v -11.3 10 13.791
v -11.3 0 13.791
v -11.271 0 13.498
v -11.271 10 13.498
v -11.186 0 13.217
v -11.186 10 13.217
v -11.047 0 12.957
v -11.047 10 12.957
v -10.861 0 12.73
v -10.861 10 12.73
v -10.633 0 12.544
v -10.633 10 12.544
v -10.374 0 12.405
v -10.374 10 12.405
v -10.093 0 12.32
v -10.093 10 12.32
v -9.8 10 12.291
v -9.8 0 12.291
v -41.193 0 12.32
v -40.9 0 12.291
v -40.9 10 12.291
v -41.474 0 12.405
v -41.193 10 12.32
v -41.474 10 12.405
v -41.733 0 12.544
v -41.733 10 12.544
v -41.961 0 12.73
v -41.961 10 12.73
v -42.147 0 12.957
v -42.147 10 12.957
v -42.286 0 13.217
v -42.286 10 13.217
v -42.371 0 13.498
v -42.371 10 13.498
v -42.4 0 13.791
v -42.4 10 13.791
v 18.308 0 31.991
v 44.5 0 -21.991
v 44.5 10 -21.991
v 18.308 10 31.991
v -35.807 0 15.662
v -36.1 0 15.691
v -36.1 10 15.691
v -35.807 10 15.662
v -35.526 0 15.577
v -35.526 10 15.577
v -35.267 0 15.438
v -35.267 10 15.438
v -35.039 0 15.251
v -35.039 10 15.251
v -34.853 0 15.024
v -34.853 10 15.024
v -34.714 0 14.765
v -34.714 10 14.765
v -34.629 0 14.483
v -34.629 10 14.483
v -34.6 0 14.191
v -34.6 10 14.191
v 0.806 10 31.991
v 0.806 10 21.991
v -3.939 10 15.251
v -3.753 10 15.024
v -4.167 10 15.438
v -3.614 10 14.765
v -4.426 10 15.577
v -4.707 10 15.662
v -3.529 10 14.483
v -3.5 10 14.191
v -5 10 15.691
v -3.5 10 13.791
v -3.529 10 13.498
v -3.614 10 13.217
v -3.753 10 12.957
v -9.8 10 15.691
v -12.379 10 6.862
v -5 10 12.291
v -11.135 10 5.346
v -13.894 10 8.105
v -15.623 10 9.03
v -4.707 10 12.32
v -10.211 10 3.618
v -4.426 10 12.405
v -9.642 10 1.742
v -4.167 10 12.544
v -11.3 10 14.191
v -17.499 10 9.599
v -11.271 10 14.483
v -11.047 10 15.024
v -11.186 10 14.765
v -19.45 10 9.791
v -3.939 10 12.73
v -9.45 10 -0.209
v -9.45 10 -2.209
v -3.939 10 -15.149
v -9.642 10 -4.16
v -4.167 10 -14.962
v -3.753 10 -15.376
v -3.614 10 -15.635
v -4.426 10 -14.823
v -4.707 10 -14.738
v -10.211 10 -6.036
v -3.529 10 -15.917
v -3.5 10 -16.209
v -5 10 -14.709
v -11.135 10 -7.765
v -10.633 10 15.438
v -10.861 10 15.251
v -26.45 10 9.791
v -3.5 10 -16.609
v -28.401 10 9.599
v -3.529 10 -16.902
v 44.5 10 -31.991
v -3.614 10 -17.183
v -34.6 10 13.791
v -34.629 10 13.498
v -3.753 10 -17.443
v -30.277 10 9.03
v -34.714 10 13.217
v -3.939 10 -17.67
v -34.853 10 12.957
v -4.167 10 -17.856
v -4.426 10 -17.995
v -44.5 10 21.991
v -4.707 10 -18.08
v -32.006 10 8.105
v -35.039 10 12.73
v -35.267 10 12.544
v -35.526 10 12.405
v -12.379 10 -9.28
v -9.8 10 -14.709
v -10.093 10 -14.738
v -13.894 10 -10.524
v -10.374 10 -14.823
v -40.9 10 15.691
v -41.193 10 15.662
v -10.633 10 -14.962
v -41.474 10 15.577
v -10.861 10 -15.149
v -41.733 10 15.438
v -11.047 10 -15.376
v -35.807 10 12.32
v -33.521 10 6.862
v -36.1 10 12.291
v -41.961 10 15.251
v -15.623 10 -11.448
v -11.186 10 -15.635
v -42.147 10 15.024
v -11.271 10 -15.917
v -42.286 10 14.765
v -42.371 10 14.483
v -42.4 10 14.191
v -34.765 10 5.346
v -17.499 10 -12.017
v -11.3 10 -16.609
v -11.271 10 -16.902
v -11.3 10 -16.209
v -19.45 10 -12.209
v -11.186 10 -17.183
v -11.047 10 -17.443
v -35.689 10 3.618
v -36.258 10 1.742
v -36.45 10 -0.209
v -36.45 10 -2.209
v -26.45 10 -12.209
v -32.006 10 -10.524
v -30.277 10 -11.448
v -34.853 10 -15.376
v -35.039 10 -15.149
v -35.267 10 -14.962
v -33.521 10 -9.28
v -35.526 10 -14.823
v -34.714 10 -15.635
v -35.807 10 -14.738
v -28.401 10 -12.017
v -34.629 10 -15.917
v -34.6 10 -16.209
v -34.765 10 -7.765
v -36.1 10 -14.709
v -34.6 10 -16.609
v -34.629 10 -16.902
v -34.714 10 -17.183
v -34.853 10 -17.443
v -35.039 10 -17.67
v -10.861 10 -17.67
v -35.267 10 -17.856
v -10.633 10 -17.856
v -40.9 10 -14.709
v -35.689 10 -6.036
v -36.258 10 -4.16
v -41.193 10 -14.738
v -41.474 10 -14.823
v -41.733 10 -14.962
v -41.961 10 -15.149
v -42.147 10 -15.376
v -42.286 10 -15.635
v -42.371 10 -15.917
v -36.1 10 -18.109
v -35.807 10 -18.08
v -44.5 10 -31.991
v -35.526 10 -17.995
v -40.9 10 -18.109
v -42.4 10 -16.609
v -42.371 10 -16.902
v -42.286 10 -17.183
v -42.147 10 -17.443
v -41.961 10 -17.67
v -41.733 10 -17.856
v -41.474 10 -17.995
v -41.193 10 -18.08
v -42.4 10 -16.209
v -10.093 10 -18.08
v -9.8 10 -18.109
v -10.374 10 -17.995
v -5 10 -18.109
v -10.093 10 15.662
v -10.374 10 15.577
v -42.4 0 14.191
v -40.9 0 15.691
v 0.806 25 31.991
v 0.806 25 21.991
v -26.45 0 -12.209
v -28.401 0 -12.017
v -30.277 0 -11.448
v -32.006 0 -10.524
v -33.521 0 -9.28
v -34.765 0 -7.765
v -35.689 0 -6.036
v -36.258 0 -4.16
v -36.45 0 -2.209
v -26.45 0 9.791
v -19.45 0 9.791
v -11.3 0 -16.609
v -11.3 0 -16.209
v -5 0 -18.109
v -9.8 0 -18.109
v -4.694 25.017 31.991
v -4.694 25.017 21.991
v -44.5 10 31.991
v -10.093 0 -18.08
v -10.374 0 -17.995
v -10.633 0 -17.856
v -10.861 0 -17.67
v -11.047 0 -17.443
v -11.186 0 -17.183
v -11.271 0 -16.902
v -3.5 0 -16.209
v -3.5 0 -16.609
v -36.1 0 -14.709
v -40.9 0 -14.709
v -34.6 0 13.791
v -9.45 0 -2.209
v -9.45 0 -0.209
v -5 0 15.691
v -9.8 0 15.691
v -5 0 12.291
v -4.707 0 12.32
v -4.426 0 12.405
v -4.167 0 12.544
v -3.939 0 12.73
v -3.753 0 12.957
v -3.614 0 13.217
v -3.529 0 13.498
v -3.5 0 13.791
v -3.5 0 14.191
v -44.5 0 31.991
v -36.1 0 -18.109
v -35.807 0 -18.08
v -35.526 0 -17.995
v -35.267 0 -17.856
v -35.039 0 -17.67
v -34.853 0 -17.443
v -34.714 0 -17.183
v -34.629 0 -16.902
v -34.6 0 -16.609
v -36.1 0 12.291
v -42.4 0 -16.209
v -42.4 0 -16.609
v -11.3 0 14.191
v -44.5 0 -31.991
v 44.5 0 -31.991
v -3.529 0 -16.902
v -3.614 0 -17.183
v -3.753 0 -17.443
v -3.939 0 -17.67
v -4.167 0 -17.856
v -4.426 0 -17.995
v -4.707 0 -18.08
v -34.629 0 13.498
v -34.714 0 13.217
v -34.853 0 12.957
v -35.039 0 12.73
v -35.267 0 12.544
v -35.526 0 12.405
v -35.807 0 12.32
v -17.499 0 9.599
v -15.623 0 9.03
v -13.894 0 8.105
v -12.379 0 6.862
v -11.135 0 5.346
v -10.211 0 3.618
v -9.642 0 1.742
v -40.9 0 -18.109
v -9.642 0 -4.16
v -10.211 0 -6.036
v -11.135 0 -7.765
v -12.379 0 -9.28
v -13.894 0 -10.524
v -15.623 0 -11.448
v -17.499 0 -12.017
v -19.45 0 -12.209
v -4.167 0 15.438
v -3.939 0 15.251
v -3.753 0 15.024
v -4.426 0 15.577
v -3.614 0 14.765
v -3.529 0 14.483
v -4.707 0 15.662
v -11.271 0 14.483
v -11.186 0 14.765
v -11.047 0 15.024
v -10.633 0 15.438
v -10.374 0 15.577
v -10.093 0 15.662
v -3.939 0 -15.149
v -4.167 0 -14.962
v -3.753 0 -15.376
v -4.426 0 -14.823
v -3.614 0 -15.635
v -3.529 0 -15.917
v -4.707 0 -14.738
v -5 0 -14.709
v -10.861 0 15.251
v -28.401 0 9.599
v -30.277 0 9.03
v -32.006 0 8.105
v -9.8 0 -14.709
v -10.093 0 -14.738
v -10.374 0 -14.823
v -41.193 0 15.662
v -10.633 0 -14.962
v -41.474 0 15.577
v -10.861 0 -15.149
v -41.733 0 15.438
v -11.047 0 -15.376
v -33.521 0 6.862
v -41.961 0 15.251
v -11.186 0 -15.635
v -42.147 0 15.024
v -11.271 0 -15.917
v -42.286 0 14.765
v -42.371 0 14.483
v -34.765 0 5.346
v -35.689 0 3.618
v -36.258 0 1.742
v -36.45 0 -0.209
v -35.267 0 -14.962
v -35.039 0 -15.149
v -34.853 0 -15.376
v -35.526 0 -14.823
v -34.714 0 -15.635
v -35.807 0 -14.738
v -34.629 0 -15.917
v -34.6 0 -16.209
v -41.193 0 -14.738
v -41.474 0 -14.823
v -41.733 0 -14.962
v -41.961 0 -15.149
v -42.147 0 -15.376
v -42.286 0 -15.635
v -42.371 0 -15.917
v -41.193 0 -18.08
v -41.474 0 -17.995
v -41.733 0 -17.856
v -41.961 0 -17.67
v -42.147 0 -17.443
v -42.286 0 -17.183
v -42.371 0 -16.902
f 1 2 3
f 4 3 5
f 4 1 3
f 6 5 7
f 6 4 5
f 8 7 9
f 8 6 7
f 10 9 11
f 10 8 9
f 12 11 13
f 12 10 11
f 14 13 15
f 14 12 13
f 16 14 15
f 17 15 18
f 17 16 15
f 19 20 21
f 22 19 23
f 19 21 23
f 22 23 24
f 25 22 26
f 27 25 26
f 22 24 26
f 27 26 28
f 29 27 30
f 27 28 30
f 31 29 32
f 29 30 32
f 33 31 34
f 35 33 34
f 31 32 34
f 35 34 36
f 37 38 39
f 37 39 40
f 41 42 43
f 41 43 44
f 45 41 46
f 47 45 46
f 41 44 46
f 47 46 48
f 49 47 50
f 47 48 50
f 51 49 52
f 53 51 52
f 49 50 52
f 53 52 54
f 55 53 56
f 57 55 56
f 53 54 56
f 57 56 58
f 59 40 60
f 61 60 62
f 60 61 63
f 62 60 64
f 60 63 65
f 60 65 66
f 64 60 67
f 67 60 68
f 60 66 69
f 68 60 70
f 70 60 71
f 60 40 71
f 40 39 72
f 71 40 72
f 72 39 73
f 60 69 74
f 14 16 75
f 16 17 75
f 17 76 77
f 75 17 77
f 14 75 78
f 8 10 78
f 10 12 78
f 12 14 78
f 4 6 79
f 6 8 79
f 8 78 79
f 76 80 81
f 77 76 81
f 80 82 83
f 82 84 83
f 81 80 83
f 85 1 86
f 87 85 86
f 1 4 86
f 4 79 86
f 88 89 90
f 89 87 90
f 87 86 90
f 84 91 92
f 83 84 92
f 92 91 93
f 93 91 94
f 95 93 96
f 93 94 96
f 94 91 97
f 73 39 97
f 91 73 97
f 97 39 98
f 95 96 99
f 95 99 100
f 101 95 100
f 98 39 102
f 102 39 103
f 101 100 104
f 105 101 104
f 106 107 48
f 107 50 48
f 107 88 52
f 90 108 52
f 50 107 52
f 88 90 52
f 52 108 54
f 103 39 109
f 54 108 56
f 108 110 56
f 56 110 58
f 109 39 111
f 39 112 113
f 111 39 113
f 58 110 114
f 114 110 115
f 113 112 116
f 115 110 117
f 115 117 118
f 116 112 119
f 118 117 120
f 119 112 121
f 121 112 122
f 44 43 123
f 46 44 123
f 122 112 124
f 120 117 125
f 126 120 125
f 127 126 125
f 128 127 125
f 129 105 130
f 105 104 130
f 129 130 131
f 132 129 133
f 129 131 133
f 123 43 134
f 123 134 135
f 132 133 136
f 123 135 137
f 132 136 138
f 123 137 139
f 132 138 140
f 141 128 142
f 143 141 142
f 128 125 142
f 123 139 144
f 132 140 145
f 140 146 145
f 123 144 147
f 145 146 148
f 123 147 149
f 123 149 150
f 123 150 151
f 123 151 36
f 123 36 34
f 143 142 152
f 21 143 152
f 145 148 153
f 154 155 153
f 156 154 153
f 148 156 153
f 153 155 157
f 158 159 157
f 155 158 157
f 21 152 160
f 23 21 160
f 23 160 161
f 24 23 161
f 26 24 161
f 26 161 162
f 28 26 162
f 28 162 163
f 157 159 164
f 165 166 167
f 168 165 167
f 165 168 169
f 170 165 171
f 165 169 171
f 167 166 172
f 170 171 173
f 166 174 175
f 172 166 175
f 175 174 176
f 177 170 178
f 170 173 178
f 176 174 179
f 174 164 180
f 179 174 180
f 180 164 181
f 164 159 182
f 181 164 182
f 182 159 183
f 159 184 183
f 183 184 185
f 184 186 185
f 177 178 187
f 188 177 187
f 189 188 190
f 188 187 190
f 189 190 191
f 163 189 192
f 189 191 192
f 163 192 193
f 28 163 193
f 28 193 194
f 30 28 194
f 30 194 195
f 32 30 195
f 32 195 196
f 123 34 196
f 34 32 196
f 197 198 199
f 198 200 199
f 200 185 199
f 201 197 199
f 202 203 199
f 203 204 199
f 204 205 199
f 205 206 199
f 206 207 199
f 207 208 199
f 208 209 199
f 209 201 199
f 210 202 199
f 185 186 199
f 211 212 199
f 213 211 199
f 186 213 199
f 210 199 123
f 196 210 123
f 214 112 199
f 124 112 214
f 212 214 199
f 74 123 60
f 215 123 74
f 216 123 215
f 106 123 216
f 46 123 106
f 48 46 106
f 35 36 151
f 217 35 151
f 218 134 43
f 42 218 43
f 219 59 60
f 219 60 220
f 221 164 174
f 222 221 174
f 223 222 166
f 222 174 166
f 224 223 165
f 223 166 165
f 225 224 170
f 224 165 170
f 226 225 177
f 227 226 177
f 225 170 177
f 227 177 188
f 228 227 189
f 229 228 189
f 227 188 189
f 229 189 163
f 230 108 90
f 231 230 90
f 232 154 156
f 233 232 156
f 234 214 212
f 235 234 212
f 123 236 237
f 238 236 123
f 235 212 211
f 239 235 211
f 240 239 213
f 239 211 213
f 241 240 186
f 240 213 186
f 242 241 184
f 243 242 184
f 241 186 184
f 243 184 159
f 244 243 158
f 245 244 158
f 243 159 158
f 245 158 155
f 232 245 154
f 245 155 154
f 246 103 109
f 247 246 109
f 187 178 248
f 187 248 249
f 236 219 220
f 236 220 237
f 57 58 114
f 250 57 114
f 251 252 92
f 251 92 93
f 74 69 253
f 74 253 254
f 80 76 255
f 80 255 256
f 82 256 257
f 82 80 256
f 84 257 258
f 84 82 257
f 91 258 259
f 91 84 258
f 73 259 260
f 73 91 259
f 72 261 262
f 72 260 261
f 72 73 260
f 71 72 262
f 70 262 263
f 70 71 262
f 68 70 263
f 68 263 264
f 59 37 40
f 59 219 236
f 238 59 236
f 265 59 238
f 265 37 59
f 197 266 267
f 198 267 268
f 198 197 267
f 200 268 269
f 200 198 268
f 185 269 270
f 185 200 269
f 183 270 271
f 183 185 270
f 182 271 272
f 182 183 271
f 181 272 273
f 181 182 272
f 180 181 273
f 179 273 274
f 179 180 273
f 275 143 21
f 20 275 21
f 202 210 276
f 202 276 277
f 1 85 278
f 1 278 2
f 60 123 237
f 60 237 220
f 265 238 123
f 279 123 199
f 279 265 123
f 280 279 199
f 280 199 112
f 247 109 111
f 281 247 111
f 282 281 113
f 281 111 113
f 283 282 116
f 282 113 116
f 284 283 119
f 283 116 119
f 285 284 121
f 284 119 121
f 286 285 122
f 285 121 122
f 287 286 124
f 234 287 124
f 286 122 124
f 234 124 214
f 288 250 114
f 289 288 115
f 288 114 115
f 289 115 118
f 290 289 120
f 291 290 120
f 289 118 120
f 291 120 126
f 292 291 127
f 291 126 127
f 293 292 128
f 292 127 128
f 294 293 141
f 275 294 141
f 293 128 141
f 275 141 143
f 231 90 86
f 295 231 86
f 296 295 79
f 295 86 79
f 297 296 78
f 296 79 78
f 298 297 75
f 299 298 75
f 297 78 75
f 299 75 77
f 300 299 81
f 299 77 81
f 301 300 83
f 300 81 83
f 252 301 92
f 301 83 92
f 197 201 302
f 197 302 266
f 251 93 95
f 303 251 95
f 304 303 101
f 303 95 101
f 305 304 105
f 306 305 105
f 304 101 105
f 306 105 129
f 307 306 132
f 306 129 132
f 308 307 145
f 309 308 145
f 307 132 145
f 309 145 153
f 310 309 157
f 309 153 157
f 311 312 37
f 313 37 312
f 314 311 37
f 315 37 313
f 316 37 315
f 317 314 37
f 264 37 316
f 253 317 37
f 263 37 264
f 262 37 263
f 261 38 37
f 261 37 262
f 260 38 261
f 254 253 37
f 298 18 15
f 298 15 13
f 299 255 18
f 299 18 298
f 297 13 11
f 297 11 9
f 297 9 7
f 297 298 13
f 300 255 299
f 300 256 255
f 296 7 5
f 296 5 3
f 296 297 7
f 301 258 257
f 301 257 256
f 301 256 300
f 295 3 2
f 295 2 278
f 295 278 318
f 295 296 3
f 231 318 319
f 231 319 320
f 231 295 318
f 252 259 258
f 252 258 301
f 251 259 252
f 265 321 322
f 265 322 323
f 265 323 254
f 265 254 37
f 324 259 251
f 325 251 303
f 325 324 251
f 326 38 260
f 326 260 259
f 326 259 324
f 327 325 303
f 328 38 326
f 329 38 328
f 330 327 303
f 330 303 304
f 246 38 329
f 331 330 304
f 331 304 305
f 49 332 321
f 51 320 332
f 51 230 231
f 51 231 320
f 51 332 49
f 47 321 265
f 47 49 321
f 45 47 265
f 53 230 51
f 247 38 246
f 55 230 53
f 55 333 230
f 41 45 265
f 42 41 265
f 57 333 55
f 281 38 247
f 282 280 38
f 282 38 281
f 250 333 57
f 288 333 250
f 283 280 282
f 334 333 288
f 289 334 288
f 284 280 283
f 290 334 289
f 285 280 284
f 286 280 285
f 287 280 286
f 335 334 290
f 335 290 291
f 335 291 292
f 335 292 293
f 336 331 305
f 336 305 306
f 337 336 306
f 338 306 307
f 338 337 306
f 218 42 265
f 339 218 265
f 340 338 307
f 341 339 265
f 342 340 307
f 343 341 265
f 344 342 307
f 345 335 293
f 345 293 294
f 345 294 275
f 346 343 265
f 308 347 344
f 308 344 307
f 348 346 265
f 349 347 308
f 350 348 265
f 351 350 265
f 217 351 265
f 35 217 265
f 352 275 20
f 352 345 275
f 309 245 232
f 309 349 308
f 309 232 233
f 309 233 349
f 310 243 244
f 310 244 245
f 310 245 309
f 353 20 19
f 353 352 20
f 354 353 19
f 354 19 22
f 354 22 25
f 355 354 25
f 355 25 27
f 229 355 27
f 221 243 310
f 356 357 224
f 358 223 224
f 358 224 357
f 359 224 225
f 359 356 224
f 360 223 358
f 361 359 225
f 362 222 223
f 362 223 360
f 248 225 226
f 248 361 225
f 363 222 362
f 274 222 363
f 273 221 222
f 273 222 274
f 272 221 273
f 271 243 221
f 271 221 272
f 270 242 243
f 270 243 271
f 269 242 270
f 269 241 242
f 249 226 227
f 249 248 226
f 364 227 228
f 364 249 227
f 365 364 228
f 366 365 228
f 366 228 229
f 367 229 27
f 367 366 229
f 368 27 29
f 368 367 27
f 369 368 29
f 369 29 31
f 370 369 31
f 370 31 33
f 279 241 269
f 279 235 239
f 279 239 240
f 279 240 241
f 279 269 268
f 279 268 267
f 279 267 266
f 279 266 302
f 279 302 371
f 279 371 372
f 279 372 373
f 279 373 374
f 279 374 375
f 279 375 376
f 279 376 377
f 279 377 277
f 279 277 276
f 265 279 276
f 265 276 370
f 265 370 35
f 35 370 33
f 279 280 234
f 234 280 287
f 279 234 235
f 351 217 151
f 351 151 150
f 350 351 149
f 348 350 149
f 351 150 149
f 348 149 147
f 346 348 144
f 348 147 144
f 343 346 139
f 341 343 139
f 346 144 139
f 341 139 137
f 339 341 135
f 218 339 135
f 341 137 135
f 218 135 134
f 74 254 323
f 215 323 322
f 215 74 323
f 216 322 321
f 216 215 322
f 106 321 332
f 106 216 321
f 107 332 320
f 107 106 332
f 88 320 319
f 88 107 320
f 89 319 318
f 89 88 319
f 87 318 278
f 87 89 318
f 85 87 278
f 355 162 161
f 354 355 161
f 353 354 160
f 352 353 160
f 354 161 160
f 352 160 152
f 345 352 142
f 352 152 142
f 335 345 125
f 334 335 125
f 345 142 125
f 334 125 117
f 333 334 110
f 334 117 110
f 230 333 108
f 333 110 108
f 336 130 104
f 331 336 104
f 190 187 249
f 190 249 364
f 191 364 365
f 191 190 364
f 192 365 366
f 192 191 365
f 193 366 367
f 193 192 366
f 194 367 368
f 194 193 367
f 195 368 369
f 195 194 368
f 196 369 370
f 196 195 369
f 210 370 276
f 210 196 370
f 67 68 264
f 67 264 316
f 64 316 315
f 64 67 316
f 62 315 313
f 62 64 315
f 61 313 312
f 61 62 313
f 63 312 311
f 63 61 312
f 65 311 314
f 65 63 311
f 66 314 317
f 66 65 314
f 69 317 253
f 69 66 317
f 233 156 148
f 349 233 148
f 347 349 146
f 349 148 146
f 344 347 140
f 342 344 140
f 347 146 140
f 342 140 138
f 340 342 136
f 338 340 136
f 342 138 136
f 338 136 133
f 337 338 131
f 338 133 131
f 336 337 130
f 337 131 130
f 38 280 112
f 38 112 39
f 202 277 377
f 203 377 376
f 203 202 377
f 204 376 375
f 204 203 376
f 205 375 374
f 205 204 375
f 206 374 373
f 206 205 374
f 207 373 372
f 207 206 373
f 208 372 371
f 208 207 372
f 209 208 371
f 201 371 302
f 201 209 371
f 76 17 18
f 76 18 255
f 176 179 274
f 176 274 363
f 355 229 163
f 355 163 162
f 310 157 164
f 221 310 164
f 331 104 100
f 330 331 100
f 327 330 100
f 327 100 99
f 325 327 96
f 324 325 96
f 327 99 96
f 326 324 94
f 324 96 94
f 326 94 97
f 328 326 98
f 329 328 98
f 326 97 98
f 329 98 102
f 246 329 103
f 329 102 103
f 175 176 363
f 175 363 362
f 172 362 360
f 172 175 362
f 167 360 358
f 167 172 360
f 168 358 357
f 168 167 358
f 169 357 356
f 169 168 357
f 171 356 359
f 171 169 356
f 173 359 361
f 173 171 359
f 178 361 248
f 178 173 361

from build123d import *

# Parameters (mm, degrees)
EXTRUDE_1_DEPTH     = 10
EXTRUDE_2_DEPTH     = 10
CUT_EXTRUDE_1_DEPTH = 57.825808474
CUT_EXTRUDE_2_DEPTH = 57.825808474


with BuildPart() as part:
    # Эскиз2 → Бобышка-Вытянуть1 (new body)
    with BuildSketch(Plane(origin=(0, 0, 0), x_dir=(1, 0, 0), z_dir=(0, 1, 0))):
        Polygon((-44.5, 31.990739153), (44.5, 31.990739153), (44.5, 21.990739153), (18.308398293, -31.990739153), (-44.5, -31.990739153), align=None)
    extrude(amount=EXTRUDE_1_DEPTH)

    # Эскиз3 → Бобышка-Вытянуть2 (add)
    with BuildSketch(Plane.XY.offset(31.990739153)):
        Polygon((-44.5, 0), (0.805588587, 0), (0.805588587, 25), (-4.694411413, 25.017160758), (-44.5, 10), align=None)
    extrude(amount=-EXTRUDE_2_DEPTH)

    # Эскиз4 → Вырез-Вытянуть1 (cut, through all)
    with BuildSketch(Plane(origin=(0, 10, 0), x_dir=(1, 0, 0), z_dir=(0, 1, 0))):
        with BuildLine():
            Line((-40.9, -15.690739153), (-36.1, -15.690739153))
            ThreePointArc((-36.1, -15.690739153), (-35.039339828, -15.251399324), (-34.6, -14.190739153))
            Line((-34.6, -14.190739153), (-34.6, -13.790739153))
            ThreePointArc((-34.6, -13.790739153), (-35.039339828, -12.730078981), (-36.1, -12.290739153))
            Line((-36.1, -12.290739153), (-40.9, -12.290739153))
            ThreePointArc((-40.9, -12.290739153), (-41.960660172, -12.730078981), (-42.4, -13.790739153))
            Line((-42.4, -13.790739153), (-42.4, -14.190739153))
            ThreePointArc((-42.4, -14.190739153), (-41.960660172, -15.251399324), (-40.9, -15.690739153))
        make_face()
        with BuildLine():
            Line((-34.6, 16.609260847), (-34.6, 16.209260847))
            ThreePointArc((-34.6, 16.209260847), (-35.039339828, 15.148600676), (-36.1, 14.709260847))
            Line((-36.1, 14.709260847), (-40.9, 14.709260847))
            ThreePointArc((-40.9, 14.709260847), (-41.960660172, 15.148600676), (-42.4, 16.209260847))
            Line((-42.4, 16.209260847), (-42.4, 16.609260847))
            ThreePointArc((-42.4, 16.609260847), (-41.960660172, 17.669921019), (-40.9, 18.109260847))
            Line((-40.9, 18.109260847), (-36.1, 18.109260847))
            ThreePointArc((-36.1, 18.109260847), (-35.039339828, 17.669921019), (-34.6, 16.609260847))
        make_face()
        with BuildLine():
            Line((-11.3, -14.190739153), (-11.3, -13.790739153))
            ThreePointArc((-11.3, -13.790739153), (-10.860660172, -12.730078981), (-9.8, -12.290739153))
            Line((-9.8, -12.290739153), (-5, -12.290739153))
            ThreePointArc((-5, -12.290739153), (-3.939339828, -12.730078981), (-3.5, -13.790739153))
            Line((-3.5, -13.790739153), (-3.5, -14.190739153))
            ThreePointArc((-3.5, -14.190739153), (-3.939339828, -15.251399324), (-5, -15.690739153))
            Line((-5, -15.690739153), (-9.8, -15.690739153))
            ThreePointArc((-9.8, -15.690739153), (-10.860660172, -15.251399324), (-11.3, -14.190739153))
        make_face()
        with BuildLine():
            Line((-11.3, 16.609260847), (-11.3, 16.209260847))
            ThreePointArc((-11.3, 16.209260847), (-10.860660172, 15.148600676), (-9.8, 14.709260847))
            Line((-9.8, 14.709260847), (-5, 14.709260847))
            ThreePointArc((-5, 14.709260847), (-3.939339828, 15.148600676), (-3.5, 16.209260847))
            Line((-3.5, 16.209260847), (-3.5, 16.609260847))
            ThreePointArc((-3.5, 16.609260847), (-3.939339828, 17.669921019), (-5, 18.109260847))
            Line((-5, 18.109260847), (-9.8, 18.109260847))
            ThreePointArc((-9.8, 18.109260847), (-10.860660172, 17.669921019), (-11.3, 16.609260847))
        make_face()
    extrude(amount=-CUT_EXTRUDE_1_DEPTH, mode=Mode.SUBTRACT)

    # Эскиз5 → Вырез-Вытянуть2 (cut, through all)
    with BuildSketch(Plane(origin=(0, 10, 0), x_dir=(1, 0, 0), z_dir=(0, 1, 0))):
        with BuildLine():
            Line((-19.45, 12.209260847), (-26.45, 12.209260847))
            ThreePointArc((-26.45, 12.209260847), (-33.521067812, 9.280328659), (-36.45, 2.209260847))
            Line((-36.45, 2.209260847), (-36.45, 0.209260847))
            ThreePointArc((-36.45, 0.209260847), (-33.521067812, -6.861806964), (-26.45, -9.790739153))
            Line((-26.45, -9.790739153), (-19.45, -9.790739153))
            ThreePointArc((-19.45, -9.790739153), (-12.378932188, -6.861806964), (-9.45, 0.209260847))
            Line((-9.45, 0.209260847), (-9.45, 2.209260847))
            ThreePointArc((-9.45, 2.209260847), (-12.378932188, 9.280328659), (-19.45, 12.209260847))
        make_face()
    extrude(amount=-CUT_EXTRUDE_2_DEPTH, mode=Mode.SUBTRACT)


solid = part.part
